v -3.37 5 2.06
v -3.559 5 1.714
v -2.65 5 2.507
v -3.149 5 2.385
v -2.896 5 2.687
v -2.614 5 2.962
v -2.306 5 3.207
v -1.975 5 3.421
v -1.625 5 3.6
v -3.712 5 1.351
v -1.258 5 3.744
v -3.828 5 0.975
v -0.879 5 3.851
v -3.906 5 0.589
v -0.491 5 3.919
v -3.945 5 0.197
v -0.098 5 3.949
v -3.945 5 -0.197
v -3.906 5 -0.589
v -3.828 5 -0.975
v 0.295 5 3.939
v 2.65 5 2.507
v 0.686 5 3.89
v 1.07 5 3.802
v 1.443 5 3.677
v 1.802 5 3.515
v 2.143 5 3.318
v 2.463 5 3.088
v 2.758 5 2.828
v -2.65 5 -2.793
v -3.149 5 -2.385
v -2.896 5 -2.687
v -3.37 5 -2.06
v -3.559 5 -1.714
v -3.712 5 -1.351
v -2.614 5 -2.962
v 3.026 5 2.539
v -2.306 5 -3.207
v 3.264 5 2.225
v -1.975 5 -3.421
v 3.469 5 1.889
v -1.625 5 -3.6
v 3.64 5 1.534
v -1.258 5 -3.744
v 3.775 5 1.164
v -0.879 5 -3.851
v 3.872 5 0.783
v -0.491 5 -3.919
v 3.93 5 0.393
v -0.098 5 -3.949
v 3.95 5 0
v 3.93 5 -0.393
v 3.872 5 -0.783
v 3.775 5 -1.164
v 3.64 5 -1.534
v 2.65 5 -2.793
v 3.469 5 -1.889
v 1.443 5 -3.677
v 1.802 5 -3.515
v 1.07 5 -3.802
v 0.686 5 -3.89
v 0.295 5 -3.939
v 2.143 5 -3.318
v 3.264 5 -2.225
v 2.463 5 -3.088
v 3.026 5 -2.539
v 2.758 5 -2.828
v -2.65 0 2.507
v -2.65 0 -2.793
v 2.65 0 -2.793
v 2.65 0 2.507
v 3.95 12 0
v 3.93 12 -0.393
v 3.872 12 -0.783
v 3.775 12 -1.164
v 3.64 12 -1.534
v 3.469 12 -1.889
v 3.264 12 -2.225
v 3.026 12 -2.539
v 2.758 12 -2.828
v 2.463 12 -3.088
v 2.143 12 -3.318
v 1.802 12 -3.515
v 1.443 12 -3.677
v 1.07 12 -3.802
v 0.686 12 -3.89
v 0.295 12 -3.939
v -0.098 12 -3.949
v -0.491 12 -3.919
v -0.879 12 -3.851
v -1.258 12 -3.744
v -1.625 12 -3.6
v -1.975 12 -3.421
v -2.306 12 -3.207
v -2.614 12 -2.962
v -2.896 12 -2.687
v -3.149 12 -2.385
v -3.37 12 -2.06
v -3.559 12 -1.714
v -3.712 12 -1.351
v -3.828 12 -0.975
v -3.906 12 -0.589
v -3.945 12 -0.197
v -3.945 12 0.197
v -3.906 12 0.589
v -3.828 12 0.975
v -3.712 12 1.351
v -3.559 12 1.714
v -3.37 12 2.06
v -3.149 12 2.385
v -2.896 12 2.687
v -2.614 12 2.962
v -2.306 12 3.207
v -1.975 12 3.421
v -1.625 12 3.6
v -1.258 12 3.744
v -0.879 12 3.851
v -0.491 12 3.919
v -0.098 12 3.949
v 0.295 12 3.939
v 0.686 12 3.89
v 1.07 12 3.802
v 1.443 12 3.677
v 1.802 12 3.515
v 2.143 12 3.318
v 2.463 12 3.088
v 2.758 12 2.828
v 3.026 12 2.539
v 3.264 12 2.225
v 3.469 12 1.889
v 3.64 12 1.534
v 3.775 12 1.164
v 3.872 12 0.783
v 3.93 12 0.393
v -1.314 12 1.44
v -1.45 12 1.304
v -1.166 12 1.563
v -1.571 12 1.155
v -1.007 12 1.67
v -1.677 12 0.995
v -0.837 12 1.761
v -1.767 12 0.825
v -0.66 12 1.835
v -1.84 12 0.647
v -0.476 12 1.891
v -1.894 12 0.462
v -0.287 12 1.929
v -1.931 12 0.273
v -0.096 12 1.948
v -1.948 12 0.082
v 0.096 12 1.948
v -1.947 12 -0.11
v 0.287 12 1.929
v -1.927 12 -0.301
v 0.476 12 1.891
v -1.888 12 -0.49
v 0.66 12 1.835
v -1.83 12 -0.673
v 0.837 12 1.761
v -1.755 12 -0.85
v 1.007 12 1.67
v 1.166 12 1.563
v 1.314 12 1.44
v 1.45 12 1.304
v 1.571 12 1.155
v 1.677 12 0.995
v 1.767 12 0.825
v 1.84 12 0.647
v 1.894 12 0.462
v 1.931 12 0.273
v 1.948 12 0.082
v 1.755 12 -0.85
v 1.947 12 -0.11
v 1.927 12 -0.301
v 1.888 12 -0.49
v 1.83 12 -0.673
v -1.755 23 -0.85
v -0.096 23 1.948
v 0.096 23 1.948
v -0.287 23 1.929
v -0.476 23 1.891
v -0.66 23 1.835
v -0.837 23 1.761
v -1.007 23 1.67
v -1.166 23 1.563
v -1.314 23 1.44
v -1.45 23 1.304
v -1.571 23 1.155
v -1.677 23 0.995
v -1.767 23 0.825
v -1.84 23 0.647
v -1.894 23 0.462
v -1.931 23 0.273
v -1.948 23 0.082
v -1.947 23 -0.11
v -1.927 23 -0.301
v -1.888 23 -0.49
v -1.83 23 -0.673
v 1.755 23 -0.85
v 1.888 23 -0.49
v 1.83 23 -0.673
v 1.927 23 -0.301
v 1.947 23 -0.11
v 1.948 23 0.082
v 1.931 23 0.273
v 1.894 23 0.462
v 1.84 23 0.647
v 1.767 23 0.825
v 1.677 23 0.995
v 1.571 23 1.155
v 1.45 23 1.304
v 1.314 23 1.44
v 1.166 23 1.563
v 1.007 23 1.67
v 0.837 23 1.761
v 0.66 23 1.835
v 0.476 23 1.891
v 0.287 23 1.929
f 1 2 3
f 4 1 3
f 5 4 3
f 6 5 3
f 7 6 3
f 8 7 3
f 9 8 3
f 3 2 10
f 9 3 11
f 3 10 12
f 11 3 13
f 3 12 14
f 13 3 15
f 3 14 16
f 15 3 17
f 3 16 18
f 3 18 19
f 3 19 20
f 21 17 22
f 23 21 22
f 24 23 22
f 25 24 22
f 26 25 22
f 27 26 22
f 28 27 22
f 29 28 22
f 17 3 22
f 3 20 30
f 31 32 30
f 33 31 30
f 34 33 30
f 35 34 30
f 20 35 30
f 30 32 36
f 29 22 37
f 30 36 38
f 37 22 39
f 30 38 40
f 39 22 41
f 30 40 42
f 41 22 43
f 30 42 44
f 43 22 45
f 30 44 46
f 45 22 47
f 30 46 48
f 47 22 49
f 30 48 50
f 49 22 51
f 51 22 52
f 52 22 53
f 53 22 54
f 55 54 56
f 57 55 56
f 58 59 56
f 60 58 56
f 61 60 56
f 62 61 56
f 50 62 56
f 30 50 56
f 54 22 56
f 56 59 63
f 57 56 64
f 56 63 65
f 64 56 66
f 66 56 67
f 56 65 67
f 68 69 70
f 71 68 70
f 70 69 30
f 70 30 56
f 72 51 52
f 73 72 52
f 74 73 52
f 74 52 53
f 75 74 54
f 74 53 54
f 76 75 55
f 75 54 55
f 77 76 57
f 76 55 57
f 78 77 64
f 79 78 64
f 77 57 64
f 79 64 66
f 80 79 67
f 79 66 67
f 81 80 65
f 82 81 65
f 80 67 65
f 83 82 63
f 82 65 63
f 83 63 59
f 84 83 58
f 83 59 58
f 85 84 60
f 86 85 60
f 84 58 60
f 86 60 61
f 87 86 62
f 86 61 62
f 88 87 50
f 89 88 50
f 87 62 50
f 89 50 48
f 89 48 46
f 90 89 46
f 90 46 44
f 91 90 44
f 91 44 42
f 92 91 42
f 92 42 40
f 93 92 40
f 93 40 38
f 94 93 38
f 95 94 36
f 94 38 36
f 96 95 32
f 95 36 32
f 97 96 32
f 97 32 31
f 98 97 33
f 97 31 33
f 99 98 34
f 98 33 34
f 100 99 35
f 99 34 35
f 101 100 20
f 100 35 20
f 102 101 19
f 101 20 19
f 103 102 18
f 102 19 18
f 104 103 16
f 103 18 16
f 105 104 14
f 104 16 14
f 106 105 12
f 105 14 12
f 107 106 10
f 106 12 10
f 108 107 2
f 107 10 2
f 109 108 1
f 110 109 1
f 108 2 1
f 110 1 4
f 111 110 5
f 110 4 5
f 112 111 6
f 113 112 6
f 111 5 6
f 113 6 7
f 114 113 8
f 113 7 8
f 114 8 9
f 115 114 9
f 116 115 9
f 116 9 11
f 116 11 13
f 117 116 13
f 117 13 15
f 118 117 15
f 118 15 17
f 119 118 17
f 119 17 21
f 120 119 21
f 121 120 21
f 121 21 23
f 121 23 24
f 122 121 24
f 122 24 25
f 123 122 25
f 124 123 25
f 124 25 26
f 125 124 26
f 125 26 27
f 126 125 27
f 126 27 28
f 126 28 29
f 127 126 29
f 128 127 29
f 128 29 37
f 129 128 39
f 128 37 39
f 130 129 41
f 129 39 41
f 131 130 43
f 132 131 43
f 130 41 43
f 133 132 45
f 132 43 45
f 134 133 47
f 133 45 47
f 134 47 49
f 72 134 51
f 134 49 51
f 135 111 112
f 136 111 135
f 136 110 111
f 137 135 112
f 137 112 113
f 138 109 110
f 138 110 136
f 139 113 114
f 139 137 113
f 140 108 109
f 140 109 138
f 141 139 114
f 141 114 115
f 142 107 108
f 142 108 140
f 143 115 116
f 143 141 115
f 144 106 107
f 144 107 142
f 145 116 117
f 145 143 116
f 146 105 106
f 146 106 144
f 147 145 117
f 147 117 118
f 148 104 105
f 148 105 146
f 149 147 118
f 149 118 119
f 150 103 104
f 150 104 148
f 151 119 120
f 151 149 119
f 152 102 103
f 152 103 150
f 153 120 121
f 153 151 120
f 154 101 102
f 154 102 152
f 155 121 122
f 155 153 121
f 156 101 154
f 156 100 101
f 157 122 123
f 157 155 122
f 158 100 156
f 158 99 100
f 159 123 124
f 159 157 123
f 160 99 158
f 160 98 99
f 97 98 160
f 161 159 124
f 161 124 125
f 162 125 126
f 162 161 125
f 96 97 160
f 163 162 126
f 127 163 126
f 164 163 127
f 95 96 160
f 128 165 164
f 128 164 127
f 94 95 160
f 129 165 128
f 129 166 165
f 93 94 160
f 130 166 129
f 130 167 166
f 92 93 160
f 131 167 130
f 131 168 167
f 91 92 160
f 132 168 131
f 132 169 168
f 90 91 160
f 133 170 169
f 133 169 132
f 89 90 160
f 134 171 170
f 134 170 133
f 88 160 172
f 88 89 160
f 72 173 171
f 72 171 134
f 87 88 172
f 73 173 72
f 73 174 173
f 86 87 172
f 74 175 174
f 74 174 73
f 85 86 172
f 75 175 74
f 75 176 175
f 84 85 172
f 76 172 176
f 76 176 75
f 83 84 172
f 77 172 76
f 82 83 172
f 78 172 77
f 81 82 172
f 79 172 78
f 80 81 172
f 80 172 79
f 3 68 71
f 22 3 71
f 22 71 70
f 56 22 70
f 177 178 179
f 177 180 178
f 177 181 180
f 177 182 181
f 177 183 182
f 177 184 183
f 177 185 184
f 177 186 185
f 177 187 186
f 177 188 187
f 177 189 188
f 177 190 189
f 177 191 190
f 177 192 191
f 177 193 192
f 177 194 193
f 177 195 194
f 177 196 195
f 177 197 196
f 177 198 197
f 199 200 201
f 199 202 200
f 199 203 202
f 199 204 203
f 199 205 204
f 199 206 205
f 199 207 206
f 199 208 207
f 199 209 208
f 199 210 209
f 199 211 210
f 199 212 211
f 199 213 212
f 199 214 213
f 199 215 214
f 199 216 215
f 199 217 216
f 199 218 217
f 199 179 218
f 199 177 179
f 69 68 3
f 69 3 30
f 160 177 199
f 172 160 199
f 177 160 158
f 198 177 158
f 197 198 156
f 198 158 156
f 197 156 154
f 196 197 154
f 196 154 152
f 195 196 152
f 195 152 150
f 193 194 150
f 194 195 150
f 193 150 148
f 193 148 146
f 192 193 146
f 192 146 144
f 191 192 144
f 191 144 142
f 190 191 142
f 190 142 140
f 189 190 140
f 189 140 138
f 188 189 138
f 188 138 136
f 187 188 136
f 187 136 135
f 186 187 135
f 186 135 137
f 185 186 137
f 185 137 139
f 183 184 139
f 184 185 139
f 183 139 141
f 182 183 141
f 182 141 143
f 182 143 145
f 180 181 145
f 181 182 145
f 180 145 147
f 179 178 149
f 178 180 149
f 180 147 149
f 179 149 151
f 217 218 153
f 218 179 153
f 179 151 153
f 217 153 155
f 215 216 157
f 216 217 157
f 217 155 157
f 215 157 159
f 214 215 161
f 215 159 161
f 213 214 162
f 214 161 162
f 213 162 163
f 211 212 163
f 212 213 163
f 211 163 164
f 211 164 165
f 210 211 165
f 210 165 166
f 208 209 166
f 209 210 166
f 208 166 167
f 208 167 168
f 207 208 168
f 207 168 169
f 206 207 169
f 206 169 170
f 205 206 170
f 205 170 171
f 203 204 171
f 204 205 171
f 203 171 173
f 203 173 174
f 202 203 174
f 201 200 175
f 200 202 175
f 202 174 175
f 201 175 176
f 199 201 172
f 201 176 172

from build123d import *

# Parameters (mm, degrees)
SKETCH1_W           = 5.3
SKETCH1_H           = 5.3
BOSS_EXTRUDE1_DEPTH = 5
SKETCH2_R           = 3.95
BOSS_EXTRUDE2_DEPTH = 7
SKETCH3_R           = 1.95
BOSS_EXTRUDE3_DEPTH = 11
CUT_EXTRUDE1_DEPTH  = 11


with BuildPart() as part:
    # Sketch1 → Boss-Extrude1 (new body)
    with BuildSketch(Plane(origin=(0, 0, 0), x_dir=(1, 0, 0), z_dir=(0, 1, 0))):
        with Locations((0, 0.143071786)):
            Rectangle(SKETCH1_W, SKETCH1_H)
    extrude(amount=BOSS_EXTRUDE1_DEPTH)

    # Sketch2 → Boss-Extrude2 (add)
    with BuildSketch(Plane(origin=(0, 5, 0), x_dir=(1, 0, 0), z_dir=(0, 1, 0))):
        Circle(SKETCH2_R)
    extrude(amount=BOSS_EXTRUDE2_DEPTH)

    # Sketch3 → Boss-Extrude3 (add)
    with BuildSketch(Plane(origin=(0, 12, 0), x_dir=(1, 0, 0), z_dir=(0, 1, 0))):
        Circle(SKETCH3_R)
    extrude(amount=BOSS_EXTRUDE3_DEPTH)

    # Sketch4 → Cut-Extrude1 (cut)
    with BuildSketch(Plane(origin=(0, 23, 0), x_dir=(1, 0, 0), z_dir=(0, 1, 0))):
        with BuildLine():
            Line((-1.754992877, 0.85), (1.754992877, 0.85))
            ThreePointArc((1.754992877, 0.85), (0, 1.95), (-1.754992877, 0.85))
        make_face()
    extrude(amount=-CUT_EXTRUDE1_DEPTH, mode=Mode.SUBTRACT)


solid = part.part
